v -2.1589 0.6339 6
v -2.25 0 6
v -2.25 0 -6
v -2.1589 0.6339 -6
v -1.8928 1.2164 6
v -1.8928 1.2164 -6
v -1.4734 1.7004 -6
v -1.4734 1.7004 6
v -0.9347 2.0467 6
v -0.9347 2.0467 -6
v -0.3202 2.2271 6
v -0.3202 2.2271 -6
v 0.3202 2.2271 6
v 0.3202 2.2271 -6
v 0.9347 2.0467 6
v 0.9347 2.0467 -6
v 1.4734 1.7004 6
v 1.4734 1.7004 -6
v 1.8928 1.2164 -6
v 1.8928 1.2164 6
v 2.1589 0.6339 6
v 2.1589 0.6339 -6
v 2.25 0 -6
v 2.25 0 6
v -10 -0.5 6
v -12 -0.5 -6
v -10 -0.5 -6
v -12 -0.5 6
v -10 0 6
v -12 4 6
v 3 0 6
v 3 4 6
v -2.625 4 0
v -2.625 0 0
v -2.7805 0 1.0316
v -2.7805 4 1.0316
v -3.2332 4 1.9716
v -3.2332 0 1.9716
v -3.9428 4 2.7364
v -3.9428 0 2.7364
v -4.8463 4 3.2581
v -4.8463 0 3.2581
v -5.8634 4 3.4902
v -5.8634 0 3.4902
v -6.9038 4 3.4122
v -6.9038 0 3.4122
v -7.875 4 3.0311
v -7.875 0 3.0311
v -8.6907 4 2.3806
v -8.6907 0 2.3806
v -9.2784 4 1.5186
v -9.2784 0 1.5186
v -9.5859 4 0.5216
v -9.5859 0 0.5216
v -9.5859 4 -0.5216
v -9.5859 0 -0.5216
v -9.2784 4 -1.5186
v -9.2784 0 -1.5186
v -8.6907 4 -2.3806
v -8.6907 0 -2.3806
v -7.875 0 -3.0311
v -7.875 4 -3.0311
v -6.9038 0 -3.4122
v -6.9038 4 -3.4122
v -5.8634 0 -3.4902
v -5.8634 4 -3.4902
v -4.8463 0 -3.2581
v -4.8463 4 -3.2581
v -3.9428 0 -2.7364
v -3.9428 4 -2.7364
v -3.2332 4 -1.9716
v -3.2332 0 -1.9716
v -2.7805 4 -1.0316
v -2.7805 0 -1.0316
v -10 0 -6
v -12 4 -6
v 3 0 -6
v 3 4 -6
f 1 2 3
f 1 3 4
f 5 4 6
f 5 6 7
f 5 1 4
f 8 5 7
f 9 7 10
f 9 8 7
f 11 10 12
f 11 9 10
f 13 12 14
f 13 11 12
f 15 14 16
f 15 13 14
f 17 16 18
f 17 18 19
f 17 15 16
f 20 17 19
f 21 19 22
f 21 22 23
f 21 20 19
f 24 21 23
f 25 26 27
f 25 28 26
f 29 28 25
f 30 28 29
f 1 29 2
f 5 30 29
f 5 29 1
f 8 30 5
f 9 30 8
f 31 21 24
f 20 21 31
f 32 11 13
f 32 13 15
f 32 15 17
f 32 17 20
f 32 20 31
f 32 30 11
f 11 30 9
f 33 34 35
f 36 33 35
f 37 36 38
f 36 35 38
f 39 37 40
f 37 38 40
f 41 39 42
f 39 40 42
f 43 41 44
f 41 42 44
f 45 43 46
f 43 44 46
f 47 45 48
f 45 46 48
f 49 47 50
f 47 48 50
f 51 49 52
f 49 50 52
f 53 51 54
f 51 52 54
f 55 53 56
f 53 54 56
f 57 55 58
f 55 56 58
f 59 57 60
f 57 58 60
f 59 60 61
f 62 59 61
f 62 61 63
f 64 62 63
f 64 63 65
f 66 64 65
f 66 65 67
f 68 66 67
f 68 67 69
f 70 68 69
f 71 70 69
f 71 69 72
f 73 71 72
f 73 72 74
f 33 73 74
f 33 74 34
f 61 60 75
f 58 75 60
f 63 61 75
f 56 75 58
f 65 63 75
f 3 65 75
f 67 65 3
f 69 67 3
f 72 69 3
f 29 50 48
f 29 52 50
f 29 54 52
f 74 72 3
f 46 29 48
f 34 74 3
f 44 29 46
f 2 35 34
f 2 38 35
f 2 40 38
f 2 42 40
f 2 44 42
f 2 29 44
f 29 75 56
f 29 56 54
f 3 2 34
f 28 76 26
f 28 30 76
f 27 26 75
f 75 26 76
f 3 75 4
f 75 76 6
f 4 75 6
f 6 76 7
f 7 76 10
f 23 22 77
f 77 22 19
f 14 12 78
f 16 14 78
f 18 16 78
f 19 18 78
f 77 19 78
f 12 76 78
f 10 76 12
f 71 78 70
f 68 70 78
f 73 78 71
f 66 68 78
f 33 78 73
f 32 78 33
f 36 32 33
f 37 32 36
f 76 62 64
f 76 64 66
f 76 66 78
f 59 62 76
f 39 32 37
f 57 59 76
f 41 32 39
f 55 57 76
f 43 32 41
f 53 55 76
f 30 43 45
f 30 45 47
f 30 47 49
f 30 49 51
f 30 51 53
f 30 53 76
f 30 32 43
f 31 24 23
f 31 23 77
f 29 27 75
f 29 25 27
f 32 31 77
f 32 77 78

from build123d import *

# Parameters (mm, degrees)
EXTRUS_O1_DEPTH       = 6
ESBO_O2_R             = 3.5
CORTE_EXTRUS_O1_DEPTH = 12


with BuildPart() as part:
    # Esboço1 → Extrusão1 (new, symmetric)
    with BuildSketch(Plane.XY):
        with BuildLine():
            Line((-10, -0.5), (-10, 0))
            Line((-10, 0), (-2.25, 0))
            ThreePointArc((-2.25, 0), (0, 2.25), (2.25, 0))
            Line((2.25, 0), (3, 0))
            Line((3, 0), (3, 4))
            Line((3, 4), (-12, 4))
            Line((-12, 4), (-12, -0.5))
            Line((-12, -0.5), (-10, -0.5))
        make_face()
    extrude(amount=EXTRUS_O1_DEPTH, both=True)

    # Esboço2 → Corte-extrusão1 (cut)
    with BuildSketch(Plane.XZ):
        with Locations((-6.125, 0)):
            Circle(ESBO_O2_R)
    extrude(amount=-CORTE_EXTRUS_O1_DEPTH, mode=Mode.SUBTRACT)


solid = part.part
